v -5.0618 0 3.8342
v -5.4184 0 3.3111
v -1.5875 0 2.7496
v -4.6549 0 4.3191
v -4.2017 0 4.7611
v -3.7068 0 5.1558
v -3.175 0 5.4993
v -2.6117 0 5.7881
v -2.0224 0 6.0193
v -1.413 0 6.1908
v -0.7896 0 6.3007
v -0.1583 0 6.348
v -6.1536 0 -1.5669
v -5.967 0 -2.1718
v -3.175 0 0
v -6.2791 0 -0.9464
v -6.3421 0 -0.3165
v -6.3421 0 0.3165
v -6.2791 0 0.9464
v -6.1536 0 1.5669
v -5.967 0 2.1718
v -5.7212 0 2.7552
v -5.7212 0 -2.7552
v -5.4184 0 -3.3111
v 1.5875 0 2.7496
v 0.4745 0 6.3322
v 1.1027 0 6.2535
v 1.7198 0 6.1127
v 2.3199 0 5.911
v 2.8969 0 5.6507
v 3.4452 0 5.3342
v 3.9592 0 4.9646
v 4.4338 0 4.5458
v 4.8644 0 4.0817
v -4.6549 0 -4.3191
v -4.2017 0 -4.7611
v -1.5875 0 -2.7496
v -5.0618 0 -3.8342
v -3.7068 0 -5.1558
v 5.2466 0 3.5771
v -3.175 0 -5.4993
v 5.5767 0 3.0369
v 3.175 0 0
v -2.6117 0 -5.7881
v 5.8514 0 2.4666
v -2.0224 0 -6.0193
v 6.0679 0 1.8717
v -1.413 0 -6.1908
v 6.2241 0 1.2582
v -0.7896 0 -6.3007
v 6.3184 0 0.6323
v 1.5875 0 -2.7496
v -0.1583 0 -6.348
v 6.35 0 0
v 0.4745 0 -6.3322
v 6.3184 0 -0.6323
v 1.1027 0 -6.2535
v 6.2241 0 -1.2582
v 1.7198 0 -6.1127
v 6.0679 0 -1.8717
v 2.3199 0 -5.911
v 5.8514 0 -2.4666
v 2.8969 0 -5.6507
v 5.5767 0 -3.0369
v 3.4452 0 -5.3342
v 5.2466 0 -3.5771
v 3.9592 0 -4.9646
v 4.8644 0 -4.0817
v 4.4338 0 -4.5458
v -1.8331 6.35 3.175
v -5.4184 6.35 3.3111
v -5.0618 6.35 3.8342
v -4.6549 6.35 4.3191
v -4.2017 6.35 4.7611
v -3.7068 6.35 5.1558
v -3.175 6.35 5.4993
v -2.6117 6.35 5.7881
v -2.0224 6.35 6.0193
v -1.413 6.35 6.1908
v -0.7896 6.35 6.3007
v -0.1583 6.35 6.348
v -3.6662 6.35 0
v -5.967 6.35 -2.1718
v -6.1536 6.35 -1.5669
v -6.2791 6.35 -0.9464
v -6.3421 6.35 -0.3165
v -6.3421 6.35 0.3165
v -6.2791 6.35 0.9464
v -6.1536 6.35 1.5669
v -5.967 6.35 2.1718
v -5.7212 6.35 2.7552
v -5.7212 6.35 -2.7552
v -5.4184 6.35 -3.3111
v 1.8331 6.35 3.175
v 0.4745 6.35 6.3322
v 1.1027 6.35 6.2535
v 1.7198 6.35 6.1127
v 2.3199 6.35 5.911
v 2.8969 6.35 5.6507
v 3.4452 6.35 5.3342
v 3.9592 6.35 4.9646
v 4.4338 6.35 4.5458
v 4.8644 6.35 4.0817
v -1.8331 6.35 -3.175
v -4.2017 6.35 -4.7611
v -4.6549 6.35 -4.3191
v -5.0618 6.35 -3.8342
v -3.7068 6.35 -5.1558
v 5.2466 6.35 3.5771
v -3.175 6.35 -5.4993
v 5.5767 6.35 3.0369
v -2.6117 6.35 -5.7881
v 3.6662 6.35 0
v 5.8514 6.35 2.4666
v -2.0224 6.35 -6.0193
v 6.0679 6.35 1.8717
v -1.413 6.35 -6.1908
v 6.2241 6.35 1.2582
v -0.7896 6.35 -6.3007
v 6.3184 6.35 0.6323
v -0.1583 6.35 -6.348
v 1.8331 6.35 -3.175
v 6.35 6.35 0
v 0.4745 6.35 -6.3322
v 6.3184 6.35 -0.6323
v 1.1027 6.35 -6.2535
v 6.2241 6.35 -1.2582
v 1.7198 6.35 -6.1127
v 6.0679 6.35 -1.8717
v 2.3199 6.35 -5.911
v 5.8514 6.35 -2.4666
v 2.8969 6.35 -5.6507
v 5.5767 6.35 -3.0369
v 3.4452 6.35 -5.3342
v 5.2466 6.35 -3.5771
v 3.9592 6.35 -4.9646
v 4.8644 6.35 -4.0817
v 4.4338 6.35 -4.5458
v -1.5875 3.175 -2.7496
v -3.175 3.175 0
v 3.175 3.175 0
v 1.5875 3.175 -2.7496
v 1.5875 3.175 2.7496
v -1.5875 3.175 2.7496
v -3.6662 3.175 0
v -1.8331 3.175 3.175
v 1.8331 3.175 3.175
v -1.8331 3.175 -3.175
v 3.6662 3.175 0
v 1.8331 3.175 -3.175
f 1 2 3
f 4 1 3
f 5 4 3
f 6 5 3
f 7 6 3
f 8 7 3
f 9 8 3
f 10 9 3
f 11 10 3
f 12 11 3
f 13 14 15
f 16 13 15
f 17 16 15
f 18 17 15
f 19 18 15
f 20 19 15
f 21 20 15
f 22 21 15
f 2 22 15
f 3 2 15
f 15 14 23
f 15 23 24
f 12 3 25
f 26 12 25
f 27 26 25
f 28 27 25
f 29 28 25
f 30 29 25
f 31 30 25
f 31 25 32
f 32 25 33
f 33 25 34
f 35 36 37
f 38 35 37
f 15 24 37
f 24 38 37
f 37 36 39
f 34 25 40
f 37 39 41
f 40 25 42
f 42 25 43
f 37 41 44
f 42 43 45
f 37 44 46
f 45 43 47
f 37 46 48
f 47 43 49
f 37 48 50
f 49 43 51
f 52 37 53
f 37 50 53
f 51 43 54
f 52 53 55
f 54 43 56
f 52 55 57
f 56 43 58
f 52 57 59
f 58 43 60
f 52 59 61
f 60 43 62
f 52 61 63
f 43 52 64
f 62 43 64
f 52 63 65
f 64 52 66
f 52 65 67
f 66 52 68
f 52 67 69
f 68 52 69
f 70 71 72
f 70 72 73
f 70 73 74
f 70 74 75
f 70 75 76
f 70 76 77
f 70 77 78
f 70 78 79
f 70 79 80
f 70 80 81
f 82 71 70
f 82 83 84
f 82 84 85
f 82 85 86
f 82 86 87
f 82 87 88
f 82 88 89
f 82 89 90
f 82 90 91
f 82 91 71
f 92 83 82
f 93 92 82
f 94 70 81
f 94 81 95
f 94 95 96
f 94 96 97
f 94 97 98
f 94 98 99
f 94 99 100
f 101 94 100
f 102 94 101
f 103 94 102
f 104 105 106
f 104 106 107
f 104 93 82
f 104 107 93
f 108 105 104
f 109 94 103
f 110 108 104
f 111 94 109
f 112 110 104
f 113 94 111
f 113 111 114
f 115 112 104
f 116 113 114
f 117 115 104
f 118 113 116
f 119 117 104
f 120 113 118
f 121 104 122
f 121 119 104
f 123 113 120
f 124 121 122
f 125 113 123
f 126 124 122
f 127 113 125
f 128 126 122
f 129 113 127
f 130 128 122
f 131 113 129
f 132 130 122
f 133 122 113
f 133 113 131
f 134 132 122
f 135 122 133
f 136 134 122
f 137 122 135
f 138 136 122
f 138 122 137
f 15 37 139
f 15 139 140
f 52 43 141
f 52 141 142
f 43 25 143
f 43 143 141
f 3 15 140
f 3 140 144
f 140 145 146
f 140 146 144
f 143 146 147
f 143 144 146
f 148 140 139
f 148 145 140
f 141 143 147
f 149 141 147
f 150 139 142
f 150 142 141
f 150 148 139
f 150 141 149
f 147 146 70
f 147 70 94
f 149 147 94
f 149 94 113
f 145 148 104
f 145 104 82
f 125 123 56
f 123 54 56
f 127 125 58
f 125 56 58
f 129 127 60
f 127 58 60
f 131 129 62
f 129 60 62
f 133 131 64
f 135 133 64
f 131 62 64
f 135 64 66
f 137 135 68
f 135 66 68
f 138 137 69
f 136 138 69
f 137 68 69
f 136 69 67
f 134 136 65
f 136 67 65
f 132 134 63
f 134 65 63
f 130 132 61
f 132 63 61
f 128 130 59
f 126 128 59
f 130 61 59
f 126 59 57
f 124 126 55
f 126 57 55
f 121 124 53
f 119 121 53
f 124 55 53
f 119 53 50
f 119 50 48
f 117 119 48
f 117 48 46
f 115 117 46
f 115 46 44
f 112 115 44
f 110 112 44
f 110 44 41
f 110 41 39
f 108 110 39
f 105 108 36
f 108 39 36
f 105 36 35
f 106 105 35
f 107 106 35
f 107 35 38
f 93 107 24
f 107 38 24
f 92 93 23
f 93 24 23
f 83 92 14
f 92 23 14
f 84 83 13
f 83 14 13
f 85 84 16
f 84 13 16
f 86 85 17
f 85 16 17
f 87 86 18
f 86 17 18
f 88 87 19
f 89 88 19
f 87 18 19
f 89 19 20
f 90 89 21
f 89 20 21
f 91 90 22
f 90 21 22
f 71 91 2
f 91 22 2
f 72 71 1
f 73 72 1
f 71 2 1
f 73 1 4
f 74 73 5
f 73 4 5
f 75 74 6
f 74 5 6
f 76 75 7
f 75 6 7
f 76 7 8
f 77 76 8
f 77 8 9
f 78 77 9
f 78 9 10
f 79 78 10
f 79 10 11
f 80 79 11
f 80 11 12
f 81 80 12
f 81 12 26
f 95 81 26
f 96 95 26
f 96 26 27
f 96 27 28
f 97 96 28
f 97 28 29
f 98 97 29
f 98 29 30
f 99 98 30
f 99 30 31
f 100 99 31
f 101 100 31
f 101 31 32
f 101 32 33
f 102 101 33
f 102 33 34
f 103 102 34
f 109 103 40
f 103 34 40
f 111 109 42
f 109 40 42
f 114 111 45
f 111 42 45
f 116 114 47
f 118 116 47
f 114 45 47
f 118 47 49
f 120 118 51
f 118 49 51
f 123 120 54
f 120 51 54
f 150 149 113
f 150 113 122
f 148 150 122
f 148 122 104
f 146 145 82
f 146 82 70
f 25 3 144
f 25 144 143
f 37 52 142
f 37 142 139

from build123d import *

# Parameters (mm, degrees)
SKETCH1_R           = 6.35
BOSS_EXTRUDE1_DEPTH = 3.175
SKETCH2_R           = 6.35
BOSS_EXTRUDE2_DEPTH = 3.175


with BuildPart() as part:
    # Sketch1 → Boss-Extrude1 (new body)
    with BuildSketch(Plane(origin=(0, 0, 0), x_dir=(1, 0, 0), z_dir=(0, 1, 0))):
        Circle(SKETCH1_R)
        Polygon((1.5875, 2.749630657), (-1.5875, 2.749630657), (-3.175, 0), (-1.5875, -2.749630657), (1.5875, -2.749630657), (3.175, 0), align=None, mode=Mode.SUBTRACT)
    extrude(amount=BOSS_EXTRUDE1_DEPTH)

    # Sketch2 → Boss-Extrude2 (add)
    with BuildSketch(Plane(origin=(0, 3.175, 0), x_dir=(1, 0, 0), z_dir=(0, 1, 0))):
        Circle(SKETCH2_R)
        Polygon((1.833087105, 3.175), (-1.833087105, 3.175), (-3.666174209, 0), (-1.833087105, -3.175), (1.833087105, -3.175), (3.666174209, 0), align=None, mode=Mode.SUBTRACT)
    extrude(amount=BOSS_EXTRUDE2_DEPTH)


solid = part.part
